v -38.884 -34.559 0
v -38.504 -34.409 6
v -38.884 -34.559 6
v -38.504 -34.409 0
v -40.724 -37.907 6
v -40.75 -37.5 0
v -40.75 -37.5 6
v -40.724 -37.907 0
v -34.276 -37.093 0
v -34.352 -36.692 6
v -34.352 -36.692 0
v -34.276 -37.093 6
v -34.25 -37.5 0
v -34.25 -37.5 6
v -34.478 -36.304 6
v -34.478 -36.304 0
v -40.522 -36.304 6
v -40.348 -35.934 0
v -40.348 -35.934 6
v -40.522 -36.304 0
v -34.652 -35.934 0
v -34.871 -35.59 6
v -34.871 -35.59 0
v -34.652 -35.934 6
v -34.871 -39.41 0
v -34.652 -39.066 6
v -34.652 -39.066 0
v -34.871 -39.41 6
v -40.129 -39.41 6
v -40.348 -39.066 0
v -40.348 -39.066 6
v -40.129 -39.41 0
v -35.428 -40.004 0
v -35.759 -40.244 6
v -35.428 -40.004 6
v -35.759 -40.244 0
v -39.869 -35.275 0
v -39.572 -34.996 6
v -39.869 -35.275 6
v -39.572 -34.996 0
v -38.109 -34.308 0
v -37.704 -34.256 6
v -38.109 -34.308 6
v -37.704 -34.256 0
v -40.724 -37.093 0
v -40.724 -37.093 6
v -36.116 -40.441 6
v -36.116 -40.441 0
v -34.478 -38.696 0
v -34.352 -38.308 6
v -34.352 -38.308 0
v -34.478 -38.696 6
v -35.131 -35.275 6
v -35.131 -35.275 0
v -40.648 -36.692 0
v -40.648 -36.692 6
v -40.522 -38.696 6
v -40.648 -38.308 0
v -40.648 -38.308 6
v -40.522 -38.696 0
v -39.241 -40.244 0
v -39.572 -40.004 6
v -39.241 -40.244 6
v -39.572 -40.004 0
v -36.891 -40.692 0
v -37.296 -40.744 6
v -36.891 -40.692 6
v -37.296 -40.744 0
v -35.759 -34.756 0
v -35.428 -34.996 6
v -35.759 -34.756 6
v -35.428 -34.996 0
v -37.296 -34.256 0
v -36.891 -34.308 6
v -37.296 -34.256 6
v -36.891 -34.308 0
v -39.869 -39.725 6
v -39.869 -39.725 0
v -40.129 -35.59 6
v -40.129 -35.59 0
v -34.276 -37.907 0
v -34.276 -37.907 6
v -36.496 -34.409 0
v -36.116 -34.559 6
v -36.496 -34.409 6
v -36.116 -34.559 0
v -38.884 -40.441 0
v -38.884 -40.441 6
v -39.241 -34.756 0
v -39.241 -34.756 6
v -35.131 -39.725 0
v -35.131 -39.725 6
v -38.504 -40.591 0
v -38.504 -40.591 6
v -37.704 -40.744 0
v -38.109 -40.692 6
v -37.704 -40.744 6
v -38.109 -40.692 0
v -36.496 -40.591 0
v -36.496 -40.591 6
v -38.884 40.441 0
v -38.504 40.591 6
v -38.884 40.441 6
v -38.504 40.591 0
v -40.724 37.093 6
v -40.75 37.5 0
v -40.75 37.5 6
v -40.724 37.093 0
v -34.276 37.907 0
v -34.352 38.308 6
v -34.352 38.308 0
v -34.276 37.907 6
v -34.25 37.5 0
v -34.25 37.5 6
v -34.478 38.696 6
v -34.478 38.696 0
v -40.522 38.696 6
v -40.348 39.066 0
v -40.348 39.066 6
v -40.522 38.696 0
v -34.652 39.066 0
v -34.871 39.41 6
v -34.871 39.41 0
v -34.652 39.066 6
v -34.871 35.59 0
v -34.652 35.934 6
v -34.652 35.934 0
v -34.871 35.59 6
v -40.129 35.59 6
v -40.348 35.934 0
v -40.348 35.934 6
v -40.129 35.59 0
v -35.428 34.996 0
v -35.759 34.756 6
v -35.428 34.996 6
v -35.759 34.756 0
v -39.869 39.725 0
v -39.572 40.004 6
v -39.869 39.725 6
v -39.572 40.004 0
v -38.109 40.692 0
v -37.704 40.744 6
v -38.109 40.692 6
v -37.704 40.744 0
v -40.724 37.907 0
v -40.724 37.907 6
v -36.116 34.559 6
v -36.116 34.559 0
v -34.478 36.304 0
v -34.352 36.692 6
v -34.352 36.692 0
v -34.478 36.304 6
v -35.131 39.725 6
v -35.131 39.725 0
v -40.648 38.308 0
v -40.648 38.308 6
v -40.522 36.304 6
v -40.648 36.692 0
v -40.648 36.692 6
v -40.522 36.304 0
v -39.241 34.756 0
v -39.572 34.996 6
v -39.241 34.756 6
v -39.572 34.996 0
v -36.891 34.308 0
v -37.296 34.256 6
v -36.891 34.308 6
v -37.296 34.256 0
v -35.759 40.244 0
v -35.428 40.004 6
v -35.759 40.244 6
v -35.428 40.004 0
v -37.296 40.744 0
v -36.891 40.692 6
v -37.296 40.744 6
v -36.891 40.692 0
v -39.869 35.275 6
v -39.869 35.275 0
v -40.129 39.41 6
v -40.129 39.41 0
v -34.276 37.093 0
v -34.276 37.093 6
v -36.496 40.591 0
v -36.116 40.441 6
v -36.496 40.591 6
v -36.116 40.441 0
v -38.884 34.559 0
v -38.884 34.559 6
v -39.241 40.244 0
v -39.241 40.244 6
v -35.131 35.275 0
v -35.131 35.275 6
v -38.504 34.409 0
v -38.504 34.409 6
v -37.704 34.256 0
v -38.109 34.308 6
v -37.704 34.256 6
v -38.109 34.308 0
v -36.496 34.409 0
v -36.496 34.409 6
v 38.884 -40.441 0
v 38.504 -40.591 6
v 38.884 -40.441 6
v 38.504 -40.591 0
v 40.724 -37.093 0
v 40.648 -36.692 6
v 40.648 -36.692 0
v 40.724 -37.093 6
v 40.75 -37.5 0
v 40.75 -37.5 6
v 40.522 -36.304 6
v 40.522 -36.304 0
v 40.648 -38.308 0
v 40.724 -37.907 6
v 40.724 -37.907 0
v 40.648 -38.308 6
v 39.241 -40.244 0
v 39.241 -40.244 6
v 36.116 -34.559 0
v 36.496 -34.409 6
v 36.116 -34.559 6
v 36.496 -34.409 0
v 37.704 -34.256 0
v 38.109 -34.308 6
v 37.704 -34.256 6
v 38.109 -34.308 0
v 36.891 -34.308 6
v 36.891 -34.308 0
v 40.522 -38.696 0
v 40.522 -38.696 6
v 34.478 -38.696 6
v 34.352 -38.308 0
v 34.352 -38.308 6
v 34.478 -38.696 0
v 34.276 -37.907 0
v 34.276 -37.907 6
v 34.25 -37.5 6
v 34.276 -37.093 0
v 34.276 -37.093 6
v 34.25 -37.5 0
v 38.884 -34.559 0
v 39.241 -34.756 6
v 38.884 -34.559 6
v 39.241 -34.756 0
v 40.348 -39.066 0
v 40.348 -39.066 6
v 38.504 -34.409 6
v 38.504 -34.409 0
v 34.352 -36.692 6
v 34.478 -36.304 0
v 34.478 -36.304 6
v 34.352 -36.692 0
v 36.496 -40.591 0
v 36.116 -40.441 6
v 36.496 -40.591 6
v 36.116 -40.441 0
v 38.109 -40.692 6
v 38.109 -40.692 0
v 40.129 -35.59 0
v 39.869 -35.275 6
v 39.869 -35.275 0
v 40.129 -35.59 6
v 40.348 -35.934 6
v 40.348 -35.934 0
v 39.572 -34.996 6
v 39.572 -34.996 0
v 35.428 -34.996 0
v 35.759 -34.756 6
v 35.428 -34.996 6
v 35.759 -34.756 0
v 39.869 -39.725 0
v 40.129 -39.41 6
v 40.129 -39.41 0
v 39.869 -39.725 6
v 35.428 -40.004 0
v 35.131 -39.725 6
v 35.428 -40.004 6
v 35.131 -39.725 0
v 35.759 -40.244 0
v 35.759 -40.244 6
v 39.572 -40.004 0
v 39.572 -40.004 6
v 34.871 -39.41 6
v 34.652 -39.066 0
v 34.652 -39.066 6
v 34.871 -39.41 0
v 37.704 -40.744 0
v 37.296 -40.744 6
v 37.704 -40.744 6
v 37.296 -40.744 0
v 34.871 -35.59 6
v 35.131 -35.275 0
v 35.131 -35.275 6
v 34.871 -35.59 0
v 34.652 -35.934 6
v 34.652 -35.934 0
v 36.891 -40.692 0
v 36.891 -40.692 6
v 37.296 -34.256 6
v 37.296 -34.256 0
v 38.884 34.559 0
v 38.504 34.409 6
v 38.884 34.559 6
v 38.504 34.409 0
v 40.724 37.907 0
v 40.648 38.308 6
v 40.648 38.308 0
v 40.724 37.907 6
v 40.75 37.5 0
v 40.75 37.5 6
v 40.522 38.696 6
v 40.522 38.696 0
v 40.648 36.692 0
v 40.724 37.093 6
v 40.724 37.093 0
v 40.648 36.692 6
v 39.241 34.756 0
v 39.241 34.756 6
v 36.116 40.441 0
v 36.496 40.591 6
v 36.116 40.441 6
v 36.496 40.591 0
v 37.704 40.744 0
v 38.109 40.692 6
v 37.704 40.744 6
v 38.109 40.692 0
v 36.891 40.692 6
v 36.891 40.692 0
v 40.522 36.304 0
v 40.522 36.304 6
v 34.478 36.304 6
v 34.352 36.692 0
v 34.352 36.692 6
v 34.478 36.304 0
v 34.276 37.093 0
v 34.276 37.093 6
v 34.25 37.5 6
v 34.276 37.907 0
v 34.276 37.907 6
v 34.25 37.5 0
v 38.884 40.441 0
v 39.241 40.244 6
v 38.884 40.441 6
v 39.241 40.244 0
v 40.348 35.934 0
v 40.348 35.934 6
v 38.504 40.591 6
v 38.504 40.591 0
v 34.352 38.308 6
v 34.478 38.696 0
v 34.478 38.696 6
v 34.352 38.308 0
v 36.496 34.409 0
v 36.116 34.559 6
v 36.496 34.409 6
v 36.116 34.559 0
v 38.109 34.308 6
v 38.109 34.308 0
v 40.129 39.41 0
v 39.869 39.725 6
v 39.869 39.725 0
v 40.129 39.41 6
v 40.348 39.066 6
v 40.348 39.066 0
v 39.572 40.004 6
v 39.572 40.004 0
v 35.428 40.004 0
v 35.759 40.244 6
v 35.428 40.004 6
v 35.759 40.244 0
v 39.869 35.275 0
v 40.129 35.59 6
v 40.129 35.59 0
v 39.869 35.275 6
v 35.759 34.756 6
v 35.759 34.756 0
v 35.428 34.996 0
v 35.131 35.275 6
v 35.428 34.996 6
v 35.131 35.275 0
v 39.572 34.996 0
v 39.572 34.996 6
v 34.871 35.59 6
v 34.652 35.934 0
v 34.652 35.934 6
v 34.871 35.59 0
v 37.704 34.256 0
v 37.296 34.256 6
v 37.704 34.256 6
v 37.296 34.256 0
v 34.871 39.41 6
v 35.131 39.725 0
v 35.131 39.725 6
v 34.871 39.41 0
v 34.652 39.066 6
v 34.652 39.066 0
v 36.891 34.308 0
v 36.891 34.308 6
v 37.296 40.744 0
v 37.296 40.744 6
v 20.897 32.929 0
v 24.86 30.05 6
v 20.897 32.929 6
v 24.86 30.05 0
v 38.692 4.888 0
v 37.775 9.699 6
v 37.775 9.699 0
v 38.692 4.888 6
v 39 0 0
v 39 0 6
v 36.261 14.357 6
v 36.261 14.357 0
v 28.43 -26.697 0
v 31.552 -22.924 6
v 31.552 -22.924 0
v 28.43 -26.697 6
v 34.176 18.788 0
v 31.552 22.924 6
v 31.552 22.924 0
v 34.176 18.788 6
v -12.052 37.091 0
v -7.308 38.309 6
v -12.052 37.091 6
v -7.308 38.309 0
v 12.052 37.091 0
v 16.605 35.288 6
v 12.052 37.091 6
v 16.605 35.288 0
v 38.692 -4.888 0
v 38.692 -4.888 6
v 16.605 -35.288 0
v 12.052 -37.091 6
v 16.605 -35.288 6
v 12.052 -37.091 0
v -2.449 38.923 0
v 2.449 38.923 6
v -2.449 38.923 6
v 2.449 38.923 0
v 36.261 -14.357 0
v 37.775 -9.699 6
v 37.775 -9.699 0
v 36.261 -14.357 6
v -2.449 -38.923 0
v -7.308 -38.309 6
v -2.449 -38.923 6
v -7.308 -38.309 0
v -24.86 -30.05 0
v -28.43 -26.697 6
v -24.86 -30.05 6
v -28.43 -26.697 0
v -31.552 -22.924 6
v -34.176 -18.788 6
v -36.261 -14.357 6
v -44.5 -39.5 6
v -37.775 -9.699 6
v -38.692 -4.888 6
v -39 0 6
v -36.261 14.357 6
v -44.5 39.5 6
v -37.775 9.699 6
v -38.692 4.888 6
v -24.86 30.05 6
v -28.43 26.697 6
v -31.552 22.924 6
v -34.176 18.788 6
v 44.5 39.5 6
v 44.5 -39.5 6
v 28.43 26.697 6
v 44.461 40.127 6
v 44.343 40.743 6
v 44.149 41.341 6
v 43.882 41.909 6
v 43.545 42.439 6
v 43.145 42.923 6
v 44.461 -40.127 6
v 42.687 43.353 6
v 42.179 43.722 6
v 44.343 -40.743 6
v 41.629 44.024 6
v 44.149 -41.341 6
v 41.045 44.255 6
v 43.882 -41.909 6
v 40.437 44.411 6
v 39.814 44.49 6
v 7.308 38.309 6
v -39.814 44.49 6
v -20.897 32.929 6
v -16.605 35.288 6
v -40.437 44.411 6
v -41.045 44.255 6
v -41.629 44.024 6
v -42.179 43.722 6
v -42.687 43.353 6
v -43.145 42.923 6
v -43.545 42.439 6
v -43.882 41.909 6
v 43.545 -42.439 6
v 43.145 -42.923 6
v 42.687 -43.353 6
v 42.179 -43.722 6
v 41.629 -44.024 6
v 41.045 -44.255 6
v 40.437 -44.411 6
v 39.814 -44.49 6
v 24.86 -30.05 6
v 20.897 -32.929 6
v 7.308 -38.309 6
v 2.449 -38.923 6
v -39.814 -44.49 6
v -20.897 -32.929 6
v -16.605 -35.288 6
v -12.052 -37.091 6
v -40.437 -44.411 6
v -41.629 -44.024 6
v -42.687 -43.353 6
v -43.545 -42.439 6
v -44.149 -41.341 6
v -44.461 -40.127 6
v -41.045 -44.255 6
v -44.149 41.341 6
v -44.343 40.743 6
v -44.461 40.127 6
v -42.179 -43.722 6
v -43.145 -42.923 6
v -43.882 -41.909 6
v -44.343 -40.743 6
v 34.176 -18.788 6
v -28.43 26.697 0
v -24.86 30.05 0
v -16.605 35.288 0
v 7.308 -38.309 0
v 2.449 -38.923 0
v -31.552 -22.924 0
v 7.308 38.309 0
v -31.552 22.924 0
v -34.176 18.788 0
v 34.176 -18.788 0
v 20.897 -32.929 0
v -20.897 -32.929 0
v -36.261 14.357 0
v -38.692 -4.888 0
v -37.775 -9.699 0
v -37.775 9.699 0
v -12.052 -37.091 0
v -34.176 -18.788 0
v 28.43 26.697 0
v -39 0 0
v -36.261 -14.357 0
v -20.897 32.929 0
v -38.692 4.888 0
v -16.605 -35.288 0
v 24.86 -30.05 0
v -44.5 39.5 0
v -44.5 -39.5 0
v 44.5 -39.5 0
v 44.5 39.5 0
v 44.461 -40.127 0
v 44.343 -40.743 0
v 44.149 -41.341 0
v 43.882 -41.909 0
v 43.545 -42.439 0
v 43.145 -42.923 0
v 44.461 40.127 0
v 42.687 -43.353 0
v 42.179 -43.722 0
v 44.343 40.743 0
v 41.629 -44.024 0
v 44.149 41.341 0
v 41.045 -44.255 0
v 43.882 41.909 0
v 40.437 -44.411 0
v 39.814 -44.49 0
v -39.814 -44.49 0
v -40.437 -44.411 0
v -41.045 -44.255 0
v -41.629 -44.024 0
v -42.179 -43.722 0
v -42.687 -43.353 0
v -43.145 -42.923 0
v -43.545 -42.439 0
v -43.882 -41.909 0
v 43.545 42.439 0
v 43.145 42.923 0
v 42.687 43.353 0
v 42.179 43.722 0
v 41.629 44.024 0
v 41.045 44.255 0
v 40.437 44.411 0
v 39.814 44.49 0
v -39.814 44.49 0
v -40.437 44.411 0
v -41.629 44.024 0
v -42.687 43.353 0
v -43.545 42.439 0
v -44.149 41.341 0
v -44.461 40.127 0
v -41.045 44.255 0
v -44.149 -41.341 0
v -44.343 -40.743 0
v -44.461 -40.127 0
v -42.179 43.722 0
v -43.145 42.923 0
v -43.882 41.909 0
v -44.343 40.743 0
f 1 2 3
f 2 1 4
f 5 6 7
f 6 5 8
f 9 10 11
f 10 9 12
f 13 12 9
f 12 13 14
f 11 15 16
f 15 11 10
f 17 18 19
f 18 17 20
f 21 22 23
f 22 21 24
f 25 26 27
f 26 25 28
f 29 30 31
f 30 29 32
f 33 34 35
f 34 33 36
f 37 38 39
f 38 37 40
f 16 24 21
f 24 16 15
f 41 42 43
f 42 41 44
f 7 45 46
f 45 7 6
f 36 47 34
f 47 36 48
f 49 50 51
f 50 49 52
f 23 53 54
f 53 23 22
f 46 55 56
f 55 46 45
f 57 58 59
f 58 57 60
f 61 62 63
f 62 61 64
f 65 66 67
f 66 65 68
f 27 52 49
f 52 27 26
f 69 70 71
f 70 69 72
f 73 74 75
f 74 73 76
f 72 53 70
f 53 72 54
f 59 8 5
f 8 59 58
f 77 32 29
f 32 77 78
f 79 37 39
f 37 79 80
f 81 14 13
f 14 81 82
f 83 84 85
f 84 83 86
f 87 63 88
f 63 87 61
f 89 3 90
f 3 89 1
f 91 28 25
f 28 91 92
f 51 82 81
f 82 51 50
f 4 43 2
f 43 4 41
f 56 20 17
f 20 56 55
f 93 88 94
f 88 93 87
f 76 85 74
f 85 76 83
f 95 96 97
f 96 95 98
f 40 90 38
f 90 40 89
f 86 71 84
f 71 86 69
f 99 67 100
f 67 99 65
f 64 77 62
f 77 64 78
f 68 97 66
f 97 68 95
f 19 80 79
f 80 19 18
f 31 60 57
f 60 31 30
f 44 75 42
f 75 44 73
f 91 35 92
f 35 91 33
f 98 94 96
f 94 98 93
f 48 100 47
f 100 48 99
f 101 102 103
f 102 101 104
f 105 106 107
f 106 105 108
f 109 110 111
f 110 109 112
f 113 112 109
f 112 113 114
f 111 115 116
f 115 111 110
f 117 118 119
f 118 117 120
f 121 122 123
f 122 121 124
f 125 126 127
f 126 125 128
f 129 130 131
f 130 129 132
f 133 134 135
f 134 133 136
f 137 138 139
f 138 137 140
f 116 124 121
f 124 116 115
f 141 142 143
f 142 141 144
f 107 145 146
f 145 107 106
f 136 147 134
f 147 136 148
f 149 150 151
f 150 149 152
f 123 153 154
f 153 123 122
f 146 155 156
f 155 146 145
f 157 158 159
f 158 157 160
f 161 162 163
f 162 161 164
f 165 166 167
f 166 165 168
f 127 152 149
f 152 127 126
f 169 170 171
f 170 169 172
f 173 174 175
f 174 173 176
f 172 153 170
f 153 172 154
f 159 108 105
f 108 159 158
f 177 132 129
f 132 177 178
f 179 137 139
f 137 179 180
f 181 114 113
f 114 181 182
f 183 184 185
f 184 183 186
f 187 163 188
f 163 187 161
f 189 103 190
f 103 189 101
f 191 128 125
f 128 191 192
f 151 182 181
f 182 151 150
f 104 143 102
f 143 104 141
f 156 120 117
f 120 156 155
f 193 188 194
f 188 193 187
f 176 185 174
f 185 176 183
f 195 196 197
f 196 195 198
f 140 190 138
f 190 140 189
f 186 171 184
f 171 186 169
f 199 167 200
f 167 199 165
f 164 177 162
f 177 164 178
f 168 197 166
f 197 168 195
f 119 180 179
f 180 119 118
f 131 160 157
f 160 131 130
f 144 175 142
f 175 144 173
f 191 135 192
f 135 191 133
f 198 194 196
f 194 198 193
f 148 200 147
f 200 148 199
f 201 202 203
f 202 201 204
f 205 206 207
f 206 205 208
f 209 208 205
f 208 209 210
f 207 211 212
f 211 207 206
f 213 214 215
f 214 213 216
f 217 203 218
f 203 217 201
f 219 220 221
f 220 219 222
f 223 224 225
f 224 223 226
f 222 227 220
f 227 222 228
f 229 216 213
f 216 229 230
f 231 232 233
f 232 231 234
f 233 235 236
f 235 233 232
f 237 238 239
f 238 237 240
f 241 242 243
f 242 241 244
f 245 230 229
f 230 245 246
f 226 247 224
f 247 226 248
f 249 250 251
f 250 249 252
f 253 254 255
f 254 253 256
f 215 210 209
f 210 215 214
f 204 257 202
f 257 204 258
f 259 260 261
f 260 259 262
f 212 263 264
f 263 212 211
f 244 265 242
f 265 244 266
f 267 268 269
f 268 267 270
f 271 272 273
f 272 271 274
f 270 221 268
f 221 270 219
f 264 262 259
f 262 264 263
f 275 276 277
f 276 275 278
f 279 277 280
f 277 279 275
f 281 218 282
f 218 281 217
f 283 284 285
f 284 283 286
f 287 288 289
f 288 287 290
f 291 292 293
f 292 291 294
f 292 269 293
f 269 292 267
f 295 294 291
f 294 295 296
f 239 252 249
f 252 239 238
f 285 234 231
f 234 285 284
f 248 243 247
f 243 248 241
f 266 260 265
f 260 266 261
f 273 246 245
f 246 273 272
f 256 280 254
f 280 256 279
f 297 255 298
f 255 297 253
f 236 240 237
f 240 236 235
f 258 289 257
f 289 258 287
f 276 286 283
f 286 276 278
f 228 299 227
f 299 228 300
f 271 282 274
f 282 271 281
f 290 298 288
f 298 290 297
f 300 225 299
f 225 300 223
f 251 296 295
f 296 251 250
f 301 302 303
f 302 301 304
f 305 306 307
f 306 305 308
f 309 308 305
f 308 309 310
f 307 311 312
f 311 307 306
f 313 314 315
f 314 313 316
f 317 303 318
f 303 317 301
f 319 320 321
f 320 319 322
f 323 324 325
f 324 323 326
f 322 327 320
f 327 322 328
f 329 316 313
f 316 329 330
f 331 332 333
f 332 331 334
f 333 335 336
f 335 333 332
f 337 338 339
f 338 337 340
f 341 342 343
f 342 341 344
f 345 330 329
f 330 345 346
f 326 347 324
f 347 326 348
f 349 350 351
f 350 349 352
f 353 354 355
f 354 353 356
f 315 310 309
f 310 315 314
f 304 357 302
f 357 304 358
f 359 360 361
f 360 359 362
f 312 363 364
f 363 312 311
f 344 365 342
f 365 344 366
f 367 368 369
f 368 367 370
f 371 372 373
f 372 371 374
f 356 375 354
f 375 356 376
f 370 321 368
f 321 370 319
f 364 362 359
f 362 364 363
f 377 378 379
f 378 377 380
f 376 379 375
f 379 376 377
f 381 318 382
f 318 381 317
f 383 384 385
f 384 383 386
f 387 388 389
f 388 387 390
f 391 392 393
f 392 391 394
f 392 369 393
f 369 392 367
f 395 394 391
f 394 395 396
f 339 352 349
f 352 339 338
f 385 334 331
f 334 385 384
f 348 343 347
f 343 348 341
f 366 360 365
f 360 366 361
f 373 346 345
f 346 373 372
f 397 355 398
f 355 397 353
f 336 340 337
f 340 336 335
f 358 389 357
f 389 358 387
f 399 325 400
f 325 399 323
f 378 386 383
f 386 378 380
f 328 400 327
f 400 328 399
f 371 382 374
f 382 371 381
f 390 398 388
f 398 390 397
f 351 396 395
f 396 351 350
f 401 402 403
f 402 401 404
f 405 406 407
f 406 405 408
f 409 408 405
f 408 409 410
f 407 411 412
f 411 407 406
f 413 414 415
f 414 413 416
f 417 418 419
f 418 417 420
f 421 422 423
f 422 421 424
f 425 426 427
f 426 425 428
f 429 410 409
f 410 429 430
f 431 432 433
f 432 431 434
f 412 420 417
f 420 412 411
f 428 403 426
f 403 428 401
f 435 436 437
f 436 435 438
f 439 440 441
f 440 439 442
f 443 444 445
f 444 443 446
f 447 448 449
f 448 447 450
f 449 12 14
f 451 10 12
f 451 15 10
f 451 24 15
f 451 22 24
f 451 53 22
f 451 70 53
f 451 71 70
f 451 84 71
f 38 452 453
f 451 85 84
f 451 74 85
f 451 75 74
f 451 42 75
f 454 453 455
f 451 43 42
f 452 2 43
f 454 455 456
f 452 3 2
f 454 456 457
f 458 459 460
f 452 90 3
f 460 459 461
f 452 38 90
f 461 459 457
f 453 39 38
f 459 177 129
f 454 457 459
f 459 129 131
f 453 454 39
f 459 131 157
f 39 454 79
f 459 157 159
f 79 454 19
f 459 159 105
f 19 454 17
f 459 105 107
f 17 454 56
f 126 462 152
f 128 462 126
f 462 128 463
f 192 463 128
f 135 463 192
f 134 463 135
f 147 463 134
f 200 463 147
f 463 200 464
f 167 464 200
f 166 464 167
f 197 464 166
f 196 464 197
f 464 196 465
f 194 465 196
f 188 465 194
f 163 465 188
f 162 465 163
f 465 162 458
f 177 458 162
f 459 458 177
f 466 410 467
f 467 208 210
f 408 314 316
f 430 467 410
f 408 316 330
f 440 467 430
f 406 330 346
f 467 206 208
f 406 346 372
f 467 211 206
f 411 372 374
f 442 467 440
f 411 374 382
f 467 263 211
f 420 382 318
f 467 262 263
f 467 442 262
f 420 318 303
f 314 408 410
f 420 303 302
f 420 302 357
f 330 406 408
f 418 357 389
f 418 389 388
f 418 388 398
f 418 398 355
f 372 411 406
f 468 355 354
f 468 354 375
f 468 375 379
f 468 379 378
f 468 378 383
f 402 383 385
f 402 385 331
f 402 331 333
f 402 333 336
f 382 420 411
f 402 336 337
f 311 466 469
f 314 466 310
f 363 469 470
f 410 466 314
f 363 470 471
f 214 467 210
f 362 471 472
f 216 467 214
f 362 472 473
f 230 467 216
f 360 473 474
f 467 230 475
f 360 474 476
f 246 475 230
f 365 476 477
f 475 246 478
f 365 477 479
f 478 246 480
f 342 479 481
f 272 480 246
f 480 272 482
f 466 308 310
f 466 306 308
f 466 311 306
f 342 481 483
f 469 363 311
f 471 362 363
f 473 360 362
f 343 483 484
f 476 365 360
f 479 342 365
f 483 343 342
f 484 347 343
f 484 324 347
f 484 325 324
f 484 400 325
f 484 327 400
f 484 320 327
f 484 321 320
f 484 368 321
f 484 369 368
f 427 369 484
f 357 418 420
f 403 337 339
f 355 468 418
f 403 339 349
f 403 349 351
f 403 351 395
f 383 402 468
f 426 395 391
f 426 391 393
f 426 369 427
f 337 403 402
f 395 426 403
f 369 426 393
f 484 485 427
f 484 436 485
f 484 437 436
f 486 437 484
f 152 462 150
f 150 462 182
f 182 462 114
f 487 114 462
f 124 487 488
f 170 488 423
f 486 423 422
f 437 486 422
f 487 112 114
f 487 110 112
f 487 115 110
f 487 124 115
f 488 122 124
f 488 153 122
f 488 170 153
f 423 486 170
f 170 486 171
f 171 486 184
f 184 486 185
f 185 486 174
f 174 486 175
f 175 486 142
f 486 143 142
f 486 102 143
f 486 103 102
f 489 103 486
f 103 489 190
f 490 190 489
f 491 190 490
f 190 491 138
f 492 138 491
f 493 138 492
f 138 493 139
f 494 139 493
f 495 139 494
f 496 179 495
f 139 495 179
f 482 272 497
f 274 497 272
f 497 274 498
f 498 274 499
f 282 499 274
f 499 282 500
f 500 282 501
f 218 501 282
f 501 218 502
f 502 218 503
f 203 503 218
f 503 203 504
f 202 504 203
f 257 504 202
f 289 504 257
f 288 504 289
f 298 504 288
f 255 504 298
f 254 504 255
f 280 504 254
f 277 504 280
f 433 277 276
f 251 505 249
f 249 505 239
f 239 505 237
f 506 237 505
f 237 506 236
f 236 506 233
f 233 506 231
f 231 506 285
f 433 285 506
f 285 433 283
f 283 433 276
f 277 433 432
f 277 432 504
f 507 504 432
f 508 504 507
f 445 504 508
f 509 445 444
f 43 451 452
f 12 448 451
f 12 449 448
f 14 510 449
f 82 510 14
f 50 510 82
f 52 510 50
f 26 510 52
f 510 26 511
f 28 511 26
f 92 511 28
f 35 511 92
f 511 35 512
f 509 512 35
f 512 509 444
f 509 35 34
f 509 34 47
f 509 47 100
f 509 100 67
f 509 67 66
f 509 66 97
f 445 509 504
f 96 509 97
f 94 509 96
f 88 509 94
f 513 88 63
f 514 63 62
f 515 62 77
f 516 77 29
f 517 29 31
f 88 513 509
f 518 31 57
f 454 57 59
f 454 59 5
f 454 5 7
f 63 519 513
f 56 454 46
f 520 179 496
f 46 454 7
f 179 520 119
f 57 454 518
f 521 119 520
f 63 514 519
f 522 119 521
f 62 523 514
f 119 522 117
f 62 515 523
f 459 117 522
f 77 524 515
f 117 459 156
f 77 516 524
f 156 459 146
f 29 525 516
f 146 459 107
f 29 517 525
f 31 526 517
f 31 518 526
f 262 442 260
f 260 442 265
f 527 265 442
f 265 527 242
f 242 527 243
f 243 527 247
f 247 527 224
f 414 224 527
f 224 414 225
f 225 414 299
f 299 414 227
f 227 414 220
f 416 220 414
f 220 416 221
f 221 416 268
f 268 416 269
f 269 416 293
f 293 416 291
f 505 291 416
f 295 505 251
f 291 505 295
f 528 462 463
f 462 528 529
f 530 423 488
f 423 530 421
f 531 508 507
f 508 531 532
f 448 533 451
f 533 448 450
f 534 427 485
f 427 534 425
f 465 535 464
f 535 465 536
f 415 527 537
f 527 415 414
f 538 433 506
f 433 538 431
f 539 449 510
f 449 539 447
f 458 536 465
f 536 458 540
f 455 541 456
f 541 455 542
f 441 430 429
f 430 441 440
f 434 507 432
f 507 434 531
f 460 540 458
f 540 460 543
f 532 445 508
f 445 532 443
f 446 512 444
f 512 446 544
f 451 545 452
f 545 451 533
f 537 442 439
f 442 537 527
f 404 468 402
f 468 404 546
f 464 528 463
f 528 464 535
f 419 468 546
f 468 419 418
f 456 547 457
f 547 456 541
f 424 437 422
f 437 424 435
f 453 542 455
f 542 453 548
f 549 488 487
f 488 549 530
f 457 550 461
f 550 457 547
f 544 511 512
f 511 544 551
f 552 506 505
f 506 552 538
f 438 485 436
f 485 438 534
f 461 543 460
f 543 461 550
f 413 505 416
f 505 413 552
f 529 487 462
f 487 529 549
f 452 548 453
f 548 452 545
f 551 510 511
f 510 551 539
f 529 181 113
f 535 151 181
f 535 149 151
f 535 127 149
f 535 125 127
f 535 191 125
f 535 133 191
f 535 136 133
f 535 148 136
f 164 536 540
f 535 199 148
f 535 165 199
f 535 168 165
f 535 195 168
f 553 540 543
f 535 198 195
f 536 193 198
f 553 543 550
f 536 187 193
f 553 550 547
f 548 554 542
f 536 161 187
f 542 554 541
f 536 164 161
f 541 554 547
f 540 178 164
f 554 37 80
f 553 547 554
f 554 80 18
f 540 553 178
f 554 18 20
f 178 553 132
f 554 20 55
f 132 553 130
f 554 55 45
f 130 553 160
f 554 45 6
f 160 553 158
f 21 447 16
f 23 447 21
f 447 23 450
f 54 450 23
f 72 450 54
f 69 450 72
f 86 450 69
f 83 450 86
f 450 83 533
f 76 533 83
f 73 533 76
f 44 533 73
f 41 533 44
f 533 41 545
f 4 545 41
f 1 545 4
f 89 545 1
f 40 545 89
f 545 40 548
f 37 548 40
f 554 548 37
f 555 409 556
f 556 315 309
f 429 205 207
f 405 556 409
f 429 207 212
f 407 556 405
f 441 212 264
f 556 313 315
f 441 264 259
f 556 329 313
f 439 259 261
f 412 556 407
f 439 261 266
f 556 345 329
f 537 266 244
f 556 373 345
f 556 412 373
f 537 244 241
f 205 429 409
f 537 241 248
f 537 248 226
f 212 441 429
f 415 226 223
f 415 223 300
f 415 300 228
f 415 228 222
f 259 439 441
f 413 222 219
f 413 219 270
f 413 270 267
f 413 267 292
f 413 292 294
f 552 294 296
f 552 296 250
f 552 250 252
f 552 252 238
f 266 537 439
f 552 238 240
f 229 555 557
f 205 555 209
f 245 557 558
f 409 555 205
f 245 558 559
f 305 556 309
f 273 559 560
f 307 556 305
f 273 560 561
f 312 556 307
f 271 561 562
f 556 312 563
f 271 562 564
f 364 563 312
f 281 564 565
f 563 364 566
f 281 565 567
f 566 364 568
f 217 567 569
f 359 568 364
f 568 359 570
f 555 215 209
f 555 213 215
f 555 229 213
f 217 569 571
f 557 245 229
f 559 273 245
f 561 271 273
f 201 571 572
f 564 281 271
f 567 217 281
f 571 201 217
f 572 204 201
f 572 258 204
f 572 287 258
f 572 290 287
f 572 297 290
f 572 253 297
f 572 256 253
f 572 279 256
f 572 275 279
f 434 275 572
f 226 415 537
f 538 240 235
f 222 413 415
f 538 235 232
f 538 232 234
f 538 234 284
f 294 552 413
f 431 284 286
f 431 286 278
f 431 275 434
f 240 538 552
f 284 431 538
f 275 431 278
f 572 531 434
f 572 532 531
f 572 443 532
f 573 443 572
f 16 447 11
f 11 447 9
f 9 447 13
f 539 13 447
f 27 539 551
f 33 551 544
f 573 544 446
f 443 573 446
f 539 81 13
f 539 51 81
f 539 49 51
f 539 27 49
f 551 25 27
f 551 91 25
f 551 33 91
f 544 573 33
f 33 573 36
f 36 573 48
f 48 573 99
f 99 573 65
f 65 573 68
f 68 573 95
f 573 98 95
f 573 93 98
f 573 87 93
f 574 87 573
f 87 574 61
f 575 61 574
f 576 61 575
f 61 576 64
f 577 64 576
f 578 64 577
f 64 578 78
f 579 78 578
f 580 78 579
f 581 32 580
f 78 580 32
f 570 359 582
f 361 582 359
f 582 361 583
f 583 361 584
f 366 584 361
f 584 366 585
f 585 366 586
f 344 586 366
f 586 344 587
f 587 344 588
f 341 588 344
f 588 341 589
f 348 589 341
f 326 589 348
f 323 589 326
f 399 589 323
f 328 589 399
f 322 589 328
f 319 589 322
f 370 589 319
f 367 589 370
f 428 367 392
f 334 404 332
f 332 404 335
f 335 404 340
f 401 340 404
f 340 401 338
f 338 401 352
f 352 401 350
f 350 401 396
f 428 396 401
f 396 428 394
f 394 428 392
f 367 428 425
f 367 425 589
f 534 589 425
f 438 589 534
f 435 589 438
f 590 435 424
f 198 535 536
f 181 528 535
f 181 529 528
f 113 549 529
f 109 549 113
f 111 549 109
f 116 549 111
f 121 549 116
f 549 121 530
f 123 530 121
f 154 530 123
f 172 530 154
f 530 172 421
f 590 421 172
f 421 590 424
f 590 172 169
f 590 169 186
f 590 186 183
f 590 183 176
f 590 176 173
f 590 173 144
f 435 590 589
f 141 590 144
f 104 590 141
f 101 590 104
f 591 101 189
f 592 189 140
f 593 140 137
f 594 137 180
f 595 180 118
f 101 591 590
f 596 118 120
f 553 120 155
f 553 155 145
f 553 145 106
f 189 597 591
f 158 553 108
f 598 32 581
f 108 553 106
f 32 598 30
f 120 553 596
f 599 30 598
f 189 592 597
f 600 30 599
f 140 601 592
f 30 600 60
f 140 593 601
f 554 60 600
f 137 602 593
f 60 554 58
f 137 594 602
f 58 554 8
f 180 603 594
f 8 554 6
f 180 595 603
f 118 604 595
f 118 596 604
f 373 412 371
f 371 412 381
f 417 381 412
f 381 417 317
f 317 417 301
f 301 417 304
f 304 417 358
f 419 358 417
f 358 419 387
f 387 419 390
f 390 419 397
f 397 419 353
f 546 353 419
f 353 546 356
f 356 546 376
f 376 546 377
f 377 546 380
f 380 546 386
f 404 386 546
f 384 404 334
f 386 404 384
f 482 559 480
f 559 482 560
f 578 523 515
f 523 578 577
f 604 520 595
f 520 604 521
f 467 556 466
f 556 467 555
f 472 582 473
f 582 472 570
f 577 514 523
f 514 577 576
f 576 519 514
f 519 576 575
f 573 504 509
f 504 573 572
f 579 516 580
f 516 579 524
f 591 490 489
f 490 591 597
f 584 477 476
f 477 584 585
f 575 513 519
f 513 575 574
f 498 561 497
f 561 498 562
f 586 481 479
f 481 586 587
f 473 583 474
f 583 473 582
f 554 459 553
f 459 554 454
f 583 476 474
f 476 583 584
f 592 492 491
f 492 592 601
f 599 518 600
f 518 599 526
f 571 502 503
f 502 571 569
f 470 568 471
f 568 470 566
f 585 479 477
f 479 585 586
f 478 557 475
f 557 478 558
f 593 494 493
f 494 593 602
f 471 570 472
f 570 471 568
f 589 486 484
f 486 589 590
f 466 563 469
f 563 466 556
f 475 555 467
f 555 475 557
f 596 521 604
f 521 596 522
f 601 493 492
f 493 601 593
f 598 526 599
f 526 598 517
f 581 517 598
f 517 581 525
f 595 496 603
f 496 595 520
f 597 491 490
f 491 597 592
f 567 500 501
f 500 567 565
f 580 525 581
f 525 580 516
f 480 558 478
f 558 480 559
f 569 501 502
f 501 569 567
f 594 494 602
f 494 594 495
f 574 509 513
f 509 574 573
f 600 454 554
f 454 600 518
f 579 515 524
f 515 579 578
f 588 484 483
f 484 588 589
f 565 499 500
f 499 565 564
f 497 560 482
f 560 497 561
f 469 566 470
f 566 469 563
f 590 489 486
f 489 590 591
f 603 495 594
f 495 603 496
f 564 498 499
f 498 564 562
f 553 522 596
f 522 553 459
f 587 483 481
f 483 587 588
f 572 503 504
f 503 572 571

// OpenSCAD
$fn = 50;


difference() {
	union() {
		hull() {
			translate(v = [-39.5000000000, 39.5000000000, 0]) {
				cylinder(h = 6, r = 5);
			}
			translate(v = [39.5000000000, 39.5000000000, 0]) {
				cylinder(h = 6, r = 5);
			}
			translate(v = [-39.5000000000, -39.5000000000, 0]) {
				cylinder(h = 6, r = 5);
			}
			translate(v = [39.5000000000, -39.5000000000, 0]) {
				cylinder(h = 6, r = 5);
			}
		}
	}
	union() {
		#translate(v = [-37.5000000000, -37.5000000000, -100.0000000000]) {
			cylinder(h = 200, r = 3.2500000000);
		}
		#translate(v = [-37.5000000000, 37.5000000000, -100.0000000000]) {
			cylinder(h = 200, r = 3.2500000000);
		}
		#translate(v = [37.5000000000, -37.5000000000, -100.0000000000]) {
			cylinder(h = 200, r = 3.2500000000);
		}
		#translate(v = [37.5000000000, 37.5000000000, -100.0000000000]) {
			cylinder(h = 200, r = 3.2500000000);
		}
		#cylinder(h = 6, r = 39.0000000000);
	}
}
